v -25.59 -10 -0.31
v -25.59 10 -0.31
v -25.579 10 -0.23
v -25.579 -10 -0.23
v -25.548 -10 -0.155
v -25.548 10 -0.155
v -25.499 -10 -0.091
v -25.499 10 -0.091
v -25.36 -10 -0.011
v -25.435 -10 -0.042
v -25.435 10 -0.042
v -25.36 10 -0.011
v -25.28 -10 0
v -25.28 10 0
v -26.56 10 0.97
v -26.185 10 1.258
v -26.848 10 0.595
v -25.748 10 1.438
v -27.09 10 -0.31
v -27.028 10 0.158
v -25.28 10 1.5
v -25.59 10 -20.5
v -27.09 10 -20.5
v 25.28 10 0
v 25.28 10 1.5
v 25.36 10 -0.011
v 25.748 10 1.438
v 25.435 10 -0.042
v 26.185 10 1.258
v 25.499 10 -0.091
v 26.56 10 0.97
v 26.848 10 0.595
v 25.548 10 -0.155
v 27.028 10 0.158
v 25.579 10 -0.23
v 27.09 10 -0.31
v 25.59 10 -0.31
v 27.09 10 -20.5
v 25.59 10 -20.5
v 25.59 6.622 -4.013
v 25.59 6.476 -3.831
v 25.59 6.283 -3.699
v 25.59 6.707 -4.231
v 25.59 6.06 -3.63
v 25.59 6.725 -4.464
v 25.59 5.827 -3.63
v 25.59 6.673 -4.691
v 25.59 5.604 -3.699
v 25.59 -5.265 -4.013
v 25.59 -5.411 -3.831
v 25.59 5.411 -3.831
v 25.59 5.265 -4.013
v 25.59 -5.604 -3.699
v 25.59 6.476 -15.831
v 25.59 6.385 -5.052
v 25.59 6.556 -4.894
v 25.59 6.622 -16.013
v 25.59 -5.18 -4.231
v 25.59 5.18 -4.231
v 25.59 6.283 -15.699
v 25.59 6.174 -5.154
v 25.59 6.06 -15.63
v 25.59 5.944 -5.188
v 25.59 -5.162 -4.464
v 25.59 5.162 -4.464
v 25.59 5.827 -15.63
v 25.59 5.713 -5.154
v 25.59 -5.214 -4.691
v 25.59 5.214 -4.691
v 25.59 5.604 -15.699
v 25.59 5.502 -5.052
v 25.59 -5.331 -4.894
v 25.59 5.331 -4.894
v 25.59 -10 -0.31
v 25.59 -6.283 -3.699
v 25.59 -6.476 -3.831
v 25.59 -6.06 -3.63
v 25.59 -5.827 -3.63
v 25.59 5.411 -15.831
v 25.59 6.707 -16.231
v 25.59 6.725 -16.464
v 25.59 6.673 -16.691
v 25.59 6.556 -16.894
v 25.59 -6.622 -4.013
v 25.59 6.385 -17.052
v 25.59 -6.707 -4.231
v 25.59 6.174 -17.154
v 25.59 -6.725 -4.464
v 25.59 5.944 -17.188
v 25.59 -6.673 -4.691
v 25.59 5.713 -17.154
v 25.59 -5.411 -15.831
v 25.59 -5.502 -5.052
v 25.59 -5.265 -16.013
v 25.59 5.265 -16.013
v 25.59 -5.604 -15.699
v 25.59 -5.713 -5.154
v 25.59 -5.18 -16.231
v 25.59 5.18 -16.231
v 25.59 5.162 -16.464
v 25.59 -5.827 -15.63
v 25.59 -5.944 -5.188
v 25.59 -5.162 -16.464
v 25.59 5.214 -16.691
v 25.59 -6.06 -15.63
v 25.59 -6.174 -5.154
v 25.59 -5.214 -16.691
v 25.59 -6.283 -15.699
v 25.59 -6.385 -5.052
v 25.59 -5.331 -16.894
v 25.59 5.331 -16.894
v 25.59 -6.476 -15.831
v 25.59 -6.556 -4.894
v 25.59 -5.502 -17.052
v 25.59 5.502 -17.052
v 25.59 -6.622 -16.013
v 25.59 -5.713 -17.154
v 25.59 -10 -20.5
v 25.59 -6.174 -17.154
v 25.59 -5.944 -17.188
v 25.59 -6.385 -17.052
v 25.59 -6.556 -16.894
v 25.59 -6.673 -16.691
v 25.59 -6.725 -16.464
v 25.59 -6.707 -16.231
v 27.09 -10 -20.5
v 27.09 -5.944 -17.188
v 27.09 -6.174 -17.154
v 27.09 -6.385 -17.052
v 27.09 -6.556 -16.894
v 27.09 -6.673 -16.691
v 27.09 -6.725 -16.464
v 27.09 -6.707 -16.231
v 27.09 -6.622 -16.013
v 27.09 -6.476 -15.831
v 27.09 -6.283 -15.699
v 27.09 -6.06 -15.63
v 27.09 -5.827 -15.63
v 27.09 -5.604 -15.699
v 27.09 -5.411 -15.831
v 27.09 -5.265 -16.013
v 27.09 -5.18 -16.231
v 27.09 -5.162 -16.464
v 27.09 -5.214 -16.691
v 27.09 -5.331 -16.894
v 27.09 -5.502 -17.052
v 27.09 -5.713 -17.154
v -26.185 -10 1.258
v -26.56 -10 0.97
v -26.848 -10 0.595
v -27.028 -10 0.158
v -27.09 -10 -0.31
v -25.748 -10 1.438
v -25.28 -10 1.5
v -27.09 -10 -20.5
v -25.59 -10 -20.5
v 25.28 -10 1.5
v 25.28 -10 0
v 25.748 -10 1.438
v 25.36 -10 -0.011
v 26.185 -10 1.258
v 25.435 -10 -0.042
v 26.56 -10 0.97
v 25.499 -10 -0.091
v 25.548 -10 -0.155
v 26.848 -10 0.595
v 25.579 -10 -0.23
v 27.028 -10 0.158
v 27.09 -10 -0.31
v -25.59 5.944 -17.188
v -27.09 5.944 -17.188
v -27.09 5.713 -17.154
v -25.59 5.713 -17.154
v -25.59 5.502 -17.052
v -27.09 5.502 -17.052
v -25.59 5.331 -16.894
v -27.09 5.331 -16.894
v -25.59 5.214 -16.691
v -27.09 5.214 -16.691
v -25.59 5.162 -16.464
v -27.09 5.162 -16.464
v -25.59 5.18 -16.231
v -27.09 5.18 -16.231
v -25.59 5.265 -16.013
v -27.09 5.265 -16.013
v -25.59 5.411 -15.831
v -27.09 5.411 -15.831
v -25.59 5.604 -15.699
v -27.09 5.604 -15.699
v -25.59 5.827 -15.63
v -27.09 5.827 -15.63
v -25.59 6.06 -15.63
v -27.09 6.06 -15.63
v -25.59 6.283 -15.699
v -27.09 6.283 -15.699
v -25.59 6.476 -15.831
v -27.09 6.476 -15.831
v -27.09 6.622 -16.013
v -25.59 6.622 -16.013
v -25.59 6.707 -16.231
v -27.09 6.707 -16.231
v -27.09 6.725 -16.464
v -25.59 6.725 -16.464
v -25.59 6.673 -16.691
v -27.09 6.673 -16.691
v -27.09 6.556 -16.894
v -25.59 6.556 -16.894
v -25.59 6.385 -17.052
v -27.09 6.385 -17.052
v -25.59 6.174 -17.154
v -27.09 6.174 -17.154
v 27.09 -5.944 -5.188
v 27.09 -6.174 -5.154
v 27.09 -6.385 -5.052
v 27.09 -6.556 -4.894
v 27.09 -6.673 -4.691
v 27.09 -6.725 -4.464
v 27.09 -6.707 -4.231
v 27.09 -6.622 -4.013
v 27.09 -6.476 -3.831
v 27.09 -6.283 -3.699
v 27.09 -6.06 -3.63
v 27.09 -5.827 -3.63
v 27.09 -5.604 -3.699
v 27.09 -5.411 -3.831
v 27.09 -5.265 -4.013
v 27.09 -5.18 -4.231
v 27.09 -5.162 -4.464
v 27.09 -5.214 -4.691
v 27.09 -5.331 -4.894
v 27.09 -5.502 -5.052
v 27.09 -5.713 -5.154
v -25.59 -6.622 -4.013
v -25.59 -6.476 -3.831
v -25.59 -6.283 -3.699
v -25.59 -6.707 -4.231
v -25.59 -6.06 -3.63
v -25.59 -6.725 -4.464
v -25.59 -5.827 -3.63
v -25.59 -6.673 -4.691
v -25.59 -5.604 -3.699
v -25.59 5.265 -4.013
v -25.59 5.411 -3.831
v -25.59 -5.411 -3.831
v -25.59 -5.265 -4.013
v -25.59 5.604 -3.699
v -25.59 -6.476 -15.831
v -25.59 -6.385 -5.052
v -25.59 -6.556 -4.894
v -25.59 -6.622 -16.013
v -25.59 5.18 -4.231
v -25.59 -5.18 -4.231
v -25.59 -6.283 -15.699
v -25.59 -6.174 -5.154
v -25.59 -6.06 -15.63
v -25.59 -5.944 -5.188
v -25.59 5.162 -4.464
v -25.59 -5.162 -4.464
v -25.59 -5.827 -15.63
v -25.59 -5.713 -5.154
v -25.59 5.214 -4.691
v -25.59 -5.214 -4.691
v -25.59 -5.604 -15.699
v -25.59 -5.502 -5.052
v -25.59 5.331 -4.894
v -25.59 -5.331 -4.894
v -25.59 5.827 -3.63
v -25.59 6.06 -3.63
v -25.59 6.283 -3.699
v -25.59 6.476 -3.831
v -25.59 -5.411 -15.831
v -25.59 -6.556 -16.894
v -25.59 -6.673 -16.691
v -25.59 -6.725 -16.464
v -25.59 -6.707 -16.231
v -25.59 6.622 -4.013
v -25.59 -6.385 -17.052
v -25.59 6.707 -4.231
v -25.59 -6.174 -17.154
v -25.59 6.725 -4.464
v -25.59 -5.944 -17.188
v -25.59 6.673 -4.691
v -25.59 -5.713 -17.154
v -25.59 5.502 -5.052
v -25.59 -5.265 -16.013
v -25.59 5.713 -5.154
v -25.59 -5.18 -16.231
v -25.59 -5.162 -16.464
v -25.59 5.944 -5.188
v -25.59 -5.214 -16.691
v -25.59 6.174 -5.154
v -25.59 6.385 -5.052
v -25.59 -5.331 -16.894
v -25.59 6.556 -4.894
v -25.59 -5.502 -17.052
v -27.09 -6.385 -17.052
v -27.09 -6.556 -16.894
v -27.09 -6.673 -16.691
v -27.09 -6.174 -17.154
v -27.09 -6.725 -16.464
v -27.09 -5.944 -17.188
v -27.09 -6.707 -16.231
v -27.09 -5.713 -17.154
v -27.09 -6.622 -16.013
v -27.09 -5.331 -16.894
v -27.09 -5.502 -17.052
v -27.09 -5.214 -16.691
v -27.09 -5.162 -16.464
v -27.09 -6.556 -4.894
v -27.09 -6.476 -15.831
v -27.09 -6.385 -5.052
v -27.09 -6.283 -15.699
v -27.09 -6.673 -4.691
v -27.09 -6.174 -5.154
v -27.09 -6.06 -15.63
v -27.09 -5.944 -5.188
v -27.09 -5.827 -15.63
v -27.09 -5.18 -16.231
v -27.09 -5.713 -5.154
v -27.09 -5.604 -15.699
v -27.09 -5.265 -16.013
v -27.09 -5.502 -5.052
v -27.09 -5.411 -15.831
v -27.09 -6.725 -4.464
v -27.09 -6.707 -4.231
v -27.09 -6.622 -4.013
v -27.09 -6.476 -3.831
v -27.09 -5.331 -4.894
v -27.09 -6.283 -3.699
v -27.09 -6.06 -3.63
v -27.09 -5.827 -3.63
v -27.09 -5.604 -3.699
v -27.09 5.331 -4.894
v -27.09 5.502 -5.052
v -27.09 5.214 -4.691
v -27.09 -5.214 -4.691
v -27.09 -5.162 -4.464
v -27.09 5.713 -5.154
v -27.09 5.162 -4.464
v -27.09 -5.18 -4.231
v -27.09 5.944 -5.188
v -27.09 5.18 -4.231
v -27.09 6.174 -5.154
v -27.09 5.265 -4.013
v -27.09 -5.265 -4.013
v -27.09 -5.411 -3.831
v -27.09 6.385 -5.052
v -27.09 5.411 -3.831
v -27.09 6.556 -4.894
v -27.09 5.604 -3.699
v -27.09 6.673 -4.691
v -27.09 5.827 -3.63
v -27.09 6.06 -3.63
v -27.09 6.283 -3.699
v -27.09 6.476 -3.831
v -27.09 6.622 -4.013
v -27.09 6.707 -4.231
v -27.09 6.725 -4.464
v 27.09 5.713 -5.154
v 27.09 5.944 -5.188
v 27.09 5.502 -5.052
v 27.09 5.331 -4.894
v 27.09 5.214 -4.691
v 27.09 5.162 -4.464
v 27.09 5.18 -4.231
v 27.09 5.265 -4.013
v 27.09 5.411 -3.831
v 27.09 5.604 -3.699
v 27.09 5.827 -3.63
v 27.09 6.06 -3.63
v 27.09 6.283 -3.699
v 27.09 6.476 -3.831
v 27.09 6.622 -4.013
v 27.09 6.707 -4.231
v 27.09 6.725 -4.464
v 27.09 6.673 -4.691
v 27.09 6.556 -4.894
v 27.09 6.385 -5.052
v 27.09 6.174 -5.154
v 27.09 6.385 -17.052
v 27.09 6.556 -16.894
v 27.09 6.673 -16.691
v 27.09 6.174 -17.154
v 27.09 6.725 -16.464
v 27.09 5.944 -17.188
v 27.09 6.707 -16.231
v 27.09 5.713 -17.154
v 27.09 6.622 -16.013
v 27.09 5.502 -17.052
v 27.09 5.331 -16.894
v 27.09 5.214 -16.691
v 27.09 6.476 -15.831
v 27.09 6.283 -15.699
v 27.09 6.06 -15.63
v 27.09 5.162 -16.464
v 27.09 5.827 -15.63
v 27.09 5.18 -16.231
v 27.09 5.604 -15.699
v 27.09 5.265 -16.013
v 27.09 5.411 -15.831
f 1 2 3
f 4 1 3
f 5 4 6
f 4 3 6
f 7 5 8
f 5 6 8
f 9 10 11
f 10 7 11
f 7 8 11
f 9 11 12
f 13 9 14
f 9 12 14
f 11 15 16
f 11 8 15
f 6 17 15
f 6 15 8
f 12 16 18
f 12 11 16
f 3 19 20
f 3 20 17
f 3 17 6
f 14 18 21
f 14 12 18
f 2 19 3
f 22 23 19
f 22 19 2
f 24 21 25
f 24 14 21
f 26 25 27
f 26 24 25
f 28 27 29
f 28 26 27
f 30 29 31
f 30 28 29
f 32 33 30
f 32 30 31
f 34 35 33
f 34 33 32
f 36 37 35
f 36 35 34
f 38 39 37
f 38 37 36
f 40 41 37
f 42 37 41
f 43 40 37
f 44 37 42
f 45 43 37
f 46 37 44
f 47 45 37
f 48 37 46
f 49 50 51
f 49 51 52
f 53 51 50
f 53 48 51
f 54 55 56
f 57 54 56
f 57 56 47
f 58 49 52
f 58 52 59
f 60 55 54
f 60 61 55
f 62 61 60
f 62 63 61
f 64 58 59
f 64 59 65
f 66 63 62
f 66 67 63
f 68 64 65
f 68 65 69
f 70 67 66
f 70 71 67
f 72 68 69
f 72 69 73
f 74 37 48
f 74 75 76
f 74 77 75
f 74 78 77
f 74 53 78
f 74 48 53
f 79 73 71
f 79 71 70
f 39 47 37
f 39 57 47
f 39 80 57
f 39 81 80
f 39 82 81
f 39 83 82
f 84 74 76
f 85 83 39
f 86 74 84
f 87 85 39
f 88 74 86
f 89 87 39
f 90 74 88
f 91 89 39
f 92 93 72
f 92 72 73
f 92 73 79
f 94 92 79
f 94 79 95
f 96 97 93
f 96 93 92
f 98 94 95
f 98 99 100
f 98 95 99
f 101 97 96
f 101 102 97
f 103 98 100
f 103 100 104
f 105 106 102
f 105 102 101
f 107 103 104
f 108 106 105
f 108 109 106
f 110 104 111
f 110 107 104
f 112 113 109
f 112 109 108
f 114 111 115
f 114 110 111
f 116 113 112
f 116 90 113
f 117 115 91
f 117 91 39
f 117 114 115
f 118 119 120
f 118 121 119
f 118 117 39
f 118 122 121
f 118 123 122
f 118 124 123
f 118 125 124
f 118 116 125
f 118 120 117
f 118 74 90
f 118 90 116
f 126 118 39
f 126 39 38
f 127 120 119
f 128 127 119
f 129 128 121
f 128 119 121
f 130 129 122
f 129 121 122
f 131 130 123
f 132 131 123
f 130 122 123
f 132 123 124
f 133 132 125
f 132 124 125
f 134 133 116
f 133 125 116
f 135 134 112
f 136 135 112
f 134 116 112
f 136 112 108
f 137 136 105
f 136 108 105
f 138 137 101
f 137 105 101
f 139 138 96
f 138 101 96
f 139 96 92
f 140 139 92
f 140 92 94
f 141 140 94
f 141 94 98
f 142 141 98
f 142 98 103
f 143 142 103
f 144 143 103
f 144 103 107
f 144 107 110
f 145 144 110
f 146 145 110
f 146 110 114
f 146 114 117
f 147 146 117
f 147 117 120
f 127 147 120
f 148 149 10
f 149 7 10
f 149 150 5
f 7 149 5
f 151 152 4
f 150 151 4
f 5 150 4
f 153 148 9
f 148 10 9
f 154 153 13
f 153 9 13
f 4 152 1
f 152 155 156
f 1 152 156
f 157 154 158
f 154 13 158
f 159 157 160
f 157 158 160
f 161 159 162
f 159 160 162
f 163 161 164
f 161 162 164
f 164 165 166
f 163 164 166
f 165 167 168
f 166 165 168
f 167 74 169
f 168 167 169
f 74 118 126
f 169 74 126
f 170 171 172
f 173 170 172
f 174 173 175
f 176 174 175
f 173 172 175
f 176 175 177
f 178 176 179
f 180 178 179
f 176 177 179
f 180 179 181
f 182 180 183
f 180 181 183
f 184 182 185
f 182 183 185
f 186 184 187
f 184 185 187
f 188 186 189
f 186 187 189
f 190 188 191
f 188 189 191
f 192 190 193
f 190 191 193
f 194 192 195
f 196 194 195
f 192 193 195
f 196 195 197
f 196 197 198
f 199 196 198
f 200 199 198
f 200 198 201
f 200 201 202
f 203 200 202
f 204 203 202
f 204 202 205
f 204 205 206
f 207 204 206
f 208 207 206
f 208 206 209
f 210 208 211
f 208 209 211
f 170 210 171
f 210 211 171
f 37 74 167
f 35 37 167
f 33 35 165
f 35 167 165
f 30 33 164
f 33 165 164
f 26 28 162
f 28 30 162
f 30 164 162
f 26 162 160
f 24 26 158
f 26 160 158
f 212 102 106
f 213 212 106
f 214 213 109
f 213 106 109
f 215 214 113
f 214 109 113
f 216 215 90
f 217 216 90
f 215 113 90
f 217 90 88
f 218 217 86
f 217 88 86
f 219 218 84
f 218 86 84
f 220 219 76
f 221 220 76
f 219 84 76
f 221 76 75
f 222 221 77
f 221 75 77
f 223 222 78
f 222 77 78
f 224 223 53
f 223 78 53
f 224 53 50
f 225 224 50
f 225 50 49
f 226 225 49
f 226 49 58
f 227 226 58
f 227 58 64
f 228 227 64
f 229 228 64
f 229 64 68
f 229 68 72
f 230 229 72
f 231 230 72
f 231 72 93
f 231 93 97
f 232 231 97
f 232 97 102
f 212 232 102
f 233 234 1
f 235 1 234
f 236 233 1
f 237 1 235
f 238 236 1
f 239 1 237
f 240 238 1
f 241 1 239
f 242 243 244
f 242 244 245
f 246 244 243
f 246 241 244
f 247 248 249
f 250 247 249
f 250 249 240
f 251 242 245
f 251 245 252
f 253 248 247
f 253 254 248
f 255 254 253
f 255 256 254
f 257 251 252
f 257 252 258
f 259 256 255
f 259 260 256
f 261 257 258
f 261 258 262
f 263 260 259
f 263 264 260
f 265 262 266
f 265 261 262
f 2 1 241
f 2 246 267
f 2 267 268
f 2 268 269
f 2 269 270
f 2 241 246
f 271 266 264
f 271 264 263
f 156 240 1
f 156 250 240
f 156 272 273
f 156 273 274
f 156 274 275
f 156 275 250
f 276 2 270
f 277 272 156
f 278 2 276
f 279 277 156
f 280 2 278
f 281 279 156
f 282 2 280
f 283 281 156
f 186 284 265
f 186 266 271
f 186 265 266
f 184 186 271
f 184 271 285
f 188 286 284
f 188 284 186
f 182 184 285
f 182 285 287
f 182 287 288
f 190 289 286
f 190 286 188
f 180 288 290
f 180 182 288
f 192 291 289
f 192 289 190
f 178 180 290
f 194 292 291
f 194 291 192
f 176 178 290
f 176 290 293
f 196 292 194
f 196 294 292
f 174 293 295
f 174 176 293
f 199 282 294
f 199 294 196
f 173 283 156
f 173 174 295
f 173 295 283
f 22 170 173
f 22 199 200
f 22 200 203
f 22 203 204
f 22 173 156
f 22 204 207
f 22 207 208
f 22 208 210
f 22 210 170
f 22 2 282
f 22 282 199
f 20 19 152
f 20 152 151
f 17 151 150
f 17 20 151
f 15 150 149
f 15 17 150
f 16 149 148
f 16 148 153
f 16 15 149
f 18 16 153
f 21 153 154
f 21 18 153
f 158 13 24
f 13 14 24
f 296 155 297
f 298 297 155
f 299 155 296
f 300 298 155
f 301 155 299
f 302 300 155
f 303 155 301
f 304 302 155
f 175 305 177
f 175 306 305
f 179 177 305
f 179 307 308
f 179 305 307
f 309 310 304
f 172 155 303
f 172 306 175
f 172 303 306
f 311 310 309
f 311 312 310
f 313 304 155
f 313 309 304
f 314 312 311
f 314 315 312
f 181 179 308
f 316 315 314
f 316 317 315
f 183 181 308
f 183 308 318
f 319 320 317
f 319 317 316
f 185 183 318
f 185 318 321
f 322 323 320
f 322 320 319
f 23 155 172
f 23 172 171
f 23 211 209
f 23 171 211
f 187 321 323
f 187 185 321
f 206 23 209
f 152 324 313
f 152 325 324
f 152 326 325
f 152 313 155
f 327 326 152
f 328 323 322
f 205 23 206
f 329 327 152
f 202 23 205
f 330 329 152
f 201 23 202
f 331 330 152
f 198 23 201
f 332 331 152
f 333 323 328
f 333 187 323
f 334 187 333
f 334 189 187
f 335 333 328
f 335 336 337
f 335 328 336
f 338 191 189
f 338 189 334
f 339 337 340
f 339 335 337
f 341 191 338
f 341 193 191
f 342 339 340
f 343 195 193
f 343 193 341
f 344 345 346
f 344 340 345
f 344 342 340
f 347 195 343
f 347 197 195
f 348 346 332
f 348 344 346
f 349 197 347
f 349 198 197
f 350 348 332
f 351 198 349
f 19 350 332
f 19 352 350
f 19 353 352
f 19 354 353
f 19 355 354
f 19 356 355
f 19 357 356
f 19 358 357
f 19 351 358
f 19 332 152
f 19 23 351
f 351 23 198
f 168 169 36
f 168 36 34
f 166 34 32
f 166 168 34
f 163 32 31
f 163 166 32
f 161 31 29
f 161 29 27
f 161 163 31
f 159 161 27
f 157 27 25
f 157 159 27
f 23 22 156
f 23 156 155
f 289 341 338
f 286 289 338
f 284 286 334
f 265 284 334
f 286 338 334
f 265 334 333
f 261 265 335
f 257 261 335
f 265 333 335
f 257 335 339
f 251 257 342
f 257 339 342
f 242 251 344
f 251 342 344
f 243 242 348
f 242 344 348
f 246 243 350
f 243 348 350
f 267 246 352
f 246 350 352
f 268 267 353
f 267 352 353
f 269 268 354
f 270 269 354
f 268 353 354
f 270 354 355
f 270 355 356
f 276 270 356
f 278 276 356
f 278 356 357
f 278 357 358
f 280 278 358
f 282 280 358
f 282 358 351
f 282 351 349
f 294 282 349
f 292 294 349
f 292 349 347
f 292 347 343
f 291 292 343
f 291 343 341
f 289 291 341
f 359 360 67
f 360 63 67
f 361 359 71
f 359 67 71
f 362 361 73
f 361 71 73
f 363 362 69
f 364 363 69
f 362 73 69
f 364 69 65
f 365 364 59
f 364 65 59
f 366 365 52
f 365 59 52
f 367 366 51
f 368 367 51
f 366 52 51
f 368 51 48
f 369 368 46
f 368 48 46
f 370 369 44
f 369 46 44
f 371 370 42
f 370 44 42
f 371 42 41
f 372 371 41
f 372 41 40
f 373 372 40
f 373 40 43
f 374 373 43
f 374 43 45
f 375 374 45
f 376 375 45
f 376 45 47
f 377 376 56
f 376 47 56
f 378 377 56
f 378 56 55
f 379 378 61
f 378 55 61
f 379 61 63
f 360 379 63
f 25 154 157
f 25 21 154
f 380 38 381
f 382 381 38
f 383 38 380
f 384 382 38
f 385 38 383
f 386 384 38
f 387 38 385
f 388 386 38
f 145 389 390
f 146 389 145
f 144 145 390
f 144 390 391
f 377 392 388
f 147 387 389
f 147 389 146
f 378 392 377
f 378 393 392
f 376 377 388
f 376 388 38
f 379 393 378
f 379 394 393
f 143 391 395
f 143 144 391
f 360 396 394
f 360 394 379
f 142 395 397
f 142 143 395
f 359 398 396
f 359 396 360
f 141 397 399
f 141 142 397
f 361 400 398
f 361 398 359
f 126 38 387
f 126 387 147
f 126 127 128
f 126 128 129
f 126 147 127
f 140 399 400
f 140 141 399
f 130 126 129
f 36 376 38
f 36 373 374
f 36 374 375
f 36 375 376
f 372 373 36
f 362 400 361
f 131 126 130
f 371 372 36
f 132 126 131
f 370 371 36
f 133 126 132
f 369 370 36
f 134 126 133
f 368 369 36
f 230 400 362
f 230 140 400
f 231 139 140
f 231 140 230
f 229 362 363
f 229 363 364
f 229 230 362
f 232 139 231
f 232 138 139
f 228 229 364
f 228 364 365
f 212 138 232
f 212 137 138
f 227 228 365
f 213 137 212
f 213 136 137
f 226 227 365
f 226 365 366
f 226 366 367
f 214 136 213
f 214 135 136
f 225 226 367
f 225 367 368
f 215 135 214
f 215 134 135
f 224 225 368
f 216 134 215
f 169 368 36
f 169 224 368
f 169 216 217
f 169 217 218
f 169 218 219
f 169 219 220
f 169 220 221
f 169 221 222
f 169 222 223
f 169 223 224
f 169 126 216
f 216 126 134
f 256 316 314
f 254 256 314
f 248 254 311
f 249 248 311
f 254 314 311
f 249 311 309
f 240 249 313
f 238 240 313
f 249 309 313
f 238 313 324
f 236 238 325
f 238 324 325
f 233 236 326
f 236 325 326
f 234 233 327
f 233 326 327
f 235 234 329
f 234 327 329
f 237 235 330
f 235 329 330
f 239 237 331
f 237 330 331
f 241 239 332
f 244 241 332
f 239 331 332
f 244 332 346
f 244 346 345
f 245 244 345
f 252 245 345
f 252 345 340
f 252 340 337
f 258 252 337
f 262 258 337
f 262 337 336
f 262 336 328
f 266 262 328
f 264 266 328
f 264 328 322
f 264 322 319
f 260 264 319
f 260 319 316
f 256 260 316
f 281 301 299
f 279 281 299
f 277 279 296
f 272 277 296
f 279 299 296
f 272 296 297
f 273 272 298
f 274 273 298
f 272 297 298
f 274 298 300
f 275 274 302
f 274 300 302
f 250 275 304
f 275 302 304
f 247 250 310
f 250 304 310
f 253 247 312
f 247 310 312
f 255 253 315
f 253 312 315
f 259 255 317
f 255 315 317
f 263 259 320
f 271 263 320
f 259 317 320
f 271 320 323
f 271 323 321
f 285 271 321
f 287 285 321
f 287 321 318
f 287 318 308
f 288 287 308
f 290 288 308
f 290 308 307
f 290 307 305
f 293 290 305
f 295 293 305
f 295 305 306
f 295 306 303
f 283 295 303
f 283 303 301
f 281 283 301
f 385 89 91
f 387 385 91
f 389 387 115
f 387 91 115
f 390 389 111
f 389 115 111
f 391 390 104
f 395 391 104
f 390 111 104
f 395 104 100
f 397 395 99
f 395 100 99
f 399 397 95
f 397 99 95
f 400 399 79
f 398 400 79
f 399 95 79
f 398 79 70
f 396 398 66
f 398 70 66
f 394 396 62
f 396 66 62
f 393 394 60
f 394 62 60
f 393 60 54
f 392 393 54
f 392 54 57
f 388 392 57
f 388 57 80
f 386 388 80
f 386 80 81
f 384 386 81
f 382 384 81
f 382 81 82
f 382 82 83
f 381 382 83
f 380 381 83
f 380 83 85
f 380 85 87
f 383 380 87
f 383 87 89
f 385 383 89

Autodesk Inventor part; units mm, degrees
ref_plane "YZ Plane" through (0, 0, 0) normal (1, 0, 0) x (0, 1, 0)
ref_plane "XZ Plane" through (0, 0, 0) normal (0, 1, 0) x (-1, 0, 0)
ref_plane "XY Plane" through (0, 0, 0) normal (0, 0, 1) x (1, 0, 0)
sketch "Sketch1" plane through (0, 0, 0) normal (0, 0, 1) x (1, 0, 0)
  line L0 (27.09, -10) -> (-27.09, -10)
  line L1 (-27.09, -10) -> (-27.09, 10)
  line L2 (-27.09, 10) -> (27.09, 10)
  line L3 (27.09, 10) -> (27.09, -10)
  line L4 (27.09, -10) -> (-27.09, 10) construction
  line L5 (-27.09, -10) -> (27.09, 10) construction
  point P0 (0, 0)
  dimension "d0" = 54.18
  dimension "d1" = 20
extrude "Plate1" add sketch "Sketch1" along normal blind 1.5
sketch "Sketch2" plane through (-25.59, 10, 1.5) normal (-1, 0, 0) x (0, -1, 0)
  line L0 (20, 0) -> (0, 0)
  line L1 (0, 0) -> (0, -22)
  line L2 (0, -22) -> (20, -22)
  line L3 (20, -22) -> (20, 0)
edge flange "Flange1" height 22 angle 90 thickness 1.5 bend radius 0.31 thickness toward (-1, 0, 0) relief tear relief width 1.5 relief depth 0.75 corner gap 0.31 corner form 0 edges at (-27.09, 0, 0) (27.09, 0, 0) wall of the first edge with corners at (-25.59, -10, 1.5) (-25.59, 10, 1.5) (-25.59, 10, -20.5) (-25.59, -10, -20.5)
bend "Bend1"
corner "Corner1"
sketch "Sketch3" plane through (27.09, -10, -20.5) normal (1, 0, 0) x (0, 0, -1)
  line L0 (-20.19, 20) -> (-20.19, 0) construction
  line L1 (0, 0) -> (-20.19, 0) construction
  line L2 (0, 20) -> (0, 0) construction
  line L3 (-20.19, 20) -> (0, 20) construction
  line L4 (0, 20) -> (-20.19, 0) construction
  line L5 (0, 0) -> (-20.19, 20) construction
  point P0 (-20.5, 10)
  point P1 (-16.095, 15.9435)
  point P2 (-4.095, 15.9435)
  point P3 (-16.095, 4.0565)
  point P4 (-4.095, 4.0565)
  dimension "d13" = 12
hole "Hole1" at (27.09, 5.9435, -4.405) at (27.09, 5.9435, -16.405) at (27.09, -5.9435, -4.405) at (27.09, -5.9435, -16.405) direction (-1, 0, 0) diameter 1.567 end through all thread size "M2x0.4" class "6H" standard "ISO Metric profile"
equation "\"d2\" = Thickness"
equation "\"d3\" = BendReliefWidth"
equation "\"d4\" = BendReliefDepth"
equation "\"d5\" = MinimumRemnant"
equation "\"d6\" = TransitionRadius"
equation "\"d9\" = BendRadius"
equation "\"d10\" = CornerReliefSize"
equation "\"d11\" = GapSize"
equation "\"d12\" = JacobiRadiusSize"
equation "\"BendReliefWidth\" = Thickness"
equation "\"BendReliefDepth\" = 0.5 * Thickness"
equation "\"CornerReliefSize\" = 4 * Thickness"
equation "\"MinimumRemnant\" = 2 * Thickness"
equation "\"TransitionRadius\" = BendRadius"
equation "\"JacobiRadiusSize\" = BendRadius"
equation "\"GapSize\" = Thickness"
equation "\"Thickness\" = 1.5"
equation "\"BendRadius\" = 0.31"
properties part number "axis_3_bottom_frame(middle)" material "Aluminum 6061-AHC"
